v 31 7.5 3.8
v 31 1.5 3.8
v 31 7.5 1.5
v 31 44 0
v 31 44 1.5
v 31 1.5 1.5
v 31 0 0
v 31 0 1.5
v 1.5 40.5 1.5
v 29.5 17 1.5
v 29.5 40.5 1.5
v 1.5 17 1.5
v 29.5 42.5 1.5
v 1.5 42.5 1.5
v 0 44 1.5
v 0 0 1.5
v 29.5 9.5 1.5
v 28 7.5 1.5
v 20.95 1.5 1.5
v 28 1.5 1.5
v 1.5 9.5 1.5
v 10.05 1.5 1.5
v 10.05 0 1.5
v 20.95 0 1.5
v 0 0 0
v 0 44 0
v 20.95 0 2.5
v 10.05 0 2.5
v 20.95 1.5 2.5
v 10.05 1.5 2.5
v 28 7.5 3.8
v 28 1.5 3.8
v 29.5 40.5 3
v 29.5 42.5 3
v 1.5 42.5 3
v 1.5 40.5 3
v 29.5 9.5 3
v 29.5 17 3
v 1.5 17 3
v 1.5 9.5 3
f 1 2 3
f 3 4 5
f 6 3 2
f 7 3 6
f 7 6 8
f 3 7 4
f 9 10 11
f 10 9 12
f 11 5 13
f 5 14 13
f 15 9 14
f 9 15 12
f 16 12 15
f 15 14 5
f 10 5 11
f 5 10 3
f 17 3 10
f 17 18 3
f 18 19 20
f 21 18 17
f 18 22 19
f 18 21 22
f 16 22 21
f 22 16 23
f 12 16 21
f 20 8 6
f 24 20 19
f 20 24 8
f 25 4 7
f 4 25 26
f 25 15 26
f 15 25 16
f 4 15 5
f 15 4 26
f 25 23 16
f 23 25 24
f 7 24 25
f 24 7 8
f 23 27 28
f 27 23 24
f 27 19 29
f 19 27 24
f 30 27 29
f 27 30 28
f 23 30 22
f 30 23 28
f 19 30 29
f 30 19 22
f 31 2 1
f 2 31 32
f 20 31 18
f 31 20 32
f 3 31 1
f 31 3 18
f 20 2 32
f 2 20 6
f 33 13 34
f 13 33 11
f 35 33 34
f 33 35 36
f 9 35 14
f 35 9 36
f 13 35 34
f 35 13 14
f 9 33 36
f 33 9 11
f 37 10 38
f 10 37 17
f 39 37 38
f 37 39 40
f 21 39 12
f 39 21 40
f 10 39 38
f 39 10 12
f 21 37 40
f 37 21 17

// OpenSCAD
// file: esp32_cam_mb_enclosure_common.scad
// common values for esp32_cam_mb_enclosure

boxFrontPanelThickness=2.25;
boxSideWallThickness=1.5;

backPlateWallThickness=1.5;

boxInnerHeight=41;
boxInnerWidth=28;
boxInnerDepth=21;

mountClipSlotHeight=15.5;  // positioned relative to boxInnerHeight
mountClipSlotDepth=2; // positioned relative to boxInnerDepth
mountClipSlotHeightPosition=17;  // bottom of the slot
mountClipSlotInsetFromBack=7; // rearmost edge


// calculated
boxOuterWidth=boxInnerWidth+boxSideWallThickness*2;
boxOuterHeight=boxInnerHeight+boxSideWallThickness*2;
boxOuterDepth=boxInnerDepth+boxFrontPanelThickness;

usbAccessHoleWidth=11;  // centered relative to boxInnerWidth

resetButtonAccessHoleHeight=6;
// main file
// esp32cam_mb_enclosure - back plate

include <esp32_cam_mb_enclosure_common.scad>

backPlateSupportDepth=1.5;

usbBackPlateFillDepth=1;
usbBackPlateFillTolerance=0.05;

resetBackPlateFillDepth=backPlateSupportDepth + 0.8;
resetBackPlateFillWidth=boxSideWallThickness*2; // circuit board corner is recessed a bit

backPlateTopSupportHeight=2;

backPlateBottomSupportHeight=7.5;
backPlateBottomSupportInsetFromBottom=8;

overlap=0.01;
$fn=50;

union() {
    cube([boxOuterWidth,boxOuterHeight,backPlateWallThickness]);
    
    translate([(boxOuterWidth/2-usbAccessHoleWidth/2)+usbBackPlateFillTolerance,0,backPlateWallThickness-overlap])
        cube([usbAccessHoleWidth-usbBackPlateFillTolerance*2,boxSideWallThickness,usbBackPlateFillDepth+overlap]);

    // reset button fill-in block        
    translate([boxOuterWidth-resetBackPlateFillWidth,boxSideWallThickness,backPlateWallThickness-overlap])
        cube([resetBackPlateFillWidth,resetButtonAccessHoleHeight,resetBackPlateFillDepth+overlap]);

    // top support
    translate([boxSideWallThickness,boxSideWallThickness+boxInnerHeight-backPlateTopSupportHeight,backPlateWallThickness-overlap])
        cube([boxInnerWidth,backPlateTopSupportHeight,backPlateSupportDepth+overlap]);

    // bottom support
    translate([boxSideWallThickness,boxSideWallThickness+backPlateBottomSupportInsetFromBottom,backPlateWallThickness-overlap])
        cube([boxInnerWidth,backPlateBottomSupportHeight,backPlateSupportDepth+overlap]);

}
